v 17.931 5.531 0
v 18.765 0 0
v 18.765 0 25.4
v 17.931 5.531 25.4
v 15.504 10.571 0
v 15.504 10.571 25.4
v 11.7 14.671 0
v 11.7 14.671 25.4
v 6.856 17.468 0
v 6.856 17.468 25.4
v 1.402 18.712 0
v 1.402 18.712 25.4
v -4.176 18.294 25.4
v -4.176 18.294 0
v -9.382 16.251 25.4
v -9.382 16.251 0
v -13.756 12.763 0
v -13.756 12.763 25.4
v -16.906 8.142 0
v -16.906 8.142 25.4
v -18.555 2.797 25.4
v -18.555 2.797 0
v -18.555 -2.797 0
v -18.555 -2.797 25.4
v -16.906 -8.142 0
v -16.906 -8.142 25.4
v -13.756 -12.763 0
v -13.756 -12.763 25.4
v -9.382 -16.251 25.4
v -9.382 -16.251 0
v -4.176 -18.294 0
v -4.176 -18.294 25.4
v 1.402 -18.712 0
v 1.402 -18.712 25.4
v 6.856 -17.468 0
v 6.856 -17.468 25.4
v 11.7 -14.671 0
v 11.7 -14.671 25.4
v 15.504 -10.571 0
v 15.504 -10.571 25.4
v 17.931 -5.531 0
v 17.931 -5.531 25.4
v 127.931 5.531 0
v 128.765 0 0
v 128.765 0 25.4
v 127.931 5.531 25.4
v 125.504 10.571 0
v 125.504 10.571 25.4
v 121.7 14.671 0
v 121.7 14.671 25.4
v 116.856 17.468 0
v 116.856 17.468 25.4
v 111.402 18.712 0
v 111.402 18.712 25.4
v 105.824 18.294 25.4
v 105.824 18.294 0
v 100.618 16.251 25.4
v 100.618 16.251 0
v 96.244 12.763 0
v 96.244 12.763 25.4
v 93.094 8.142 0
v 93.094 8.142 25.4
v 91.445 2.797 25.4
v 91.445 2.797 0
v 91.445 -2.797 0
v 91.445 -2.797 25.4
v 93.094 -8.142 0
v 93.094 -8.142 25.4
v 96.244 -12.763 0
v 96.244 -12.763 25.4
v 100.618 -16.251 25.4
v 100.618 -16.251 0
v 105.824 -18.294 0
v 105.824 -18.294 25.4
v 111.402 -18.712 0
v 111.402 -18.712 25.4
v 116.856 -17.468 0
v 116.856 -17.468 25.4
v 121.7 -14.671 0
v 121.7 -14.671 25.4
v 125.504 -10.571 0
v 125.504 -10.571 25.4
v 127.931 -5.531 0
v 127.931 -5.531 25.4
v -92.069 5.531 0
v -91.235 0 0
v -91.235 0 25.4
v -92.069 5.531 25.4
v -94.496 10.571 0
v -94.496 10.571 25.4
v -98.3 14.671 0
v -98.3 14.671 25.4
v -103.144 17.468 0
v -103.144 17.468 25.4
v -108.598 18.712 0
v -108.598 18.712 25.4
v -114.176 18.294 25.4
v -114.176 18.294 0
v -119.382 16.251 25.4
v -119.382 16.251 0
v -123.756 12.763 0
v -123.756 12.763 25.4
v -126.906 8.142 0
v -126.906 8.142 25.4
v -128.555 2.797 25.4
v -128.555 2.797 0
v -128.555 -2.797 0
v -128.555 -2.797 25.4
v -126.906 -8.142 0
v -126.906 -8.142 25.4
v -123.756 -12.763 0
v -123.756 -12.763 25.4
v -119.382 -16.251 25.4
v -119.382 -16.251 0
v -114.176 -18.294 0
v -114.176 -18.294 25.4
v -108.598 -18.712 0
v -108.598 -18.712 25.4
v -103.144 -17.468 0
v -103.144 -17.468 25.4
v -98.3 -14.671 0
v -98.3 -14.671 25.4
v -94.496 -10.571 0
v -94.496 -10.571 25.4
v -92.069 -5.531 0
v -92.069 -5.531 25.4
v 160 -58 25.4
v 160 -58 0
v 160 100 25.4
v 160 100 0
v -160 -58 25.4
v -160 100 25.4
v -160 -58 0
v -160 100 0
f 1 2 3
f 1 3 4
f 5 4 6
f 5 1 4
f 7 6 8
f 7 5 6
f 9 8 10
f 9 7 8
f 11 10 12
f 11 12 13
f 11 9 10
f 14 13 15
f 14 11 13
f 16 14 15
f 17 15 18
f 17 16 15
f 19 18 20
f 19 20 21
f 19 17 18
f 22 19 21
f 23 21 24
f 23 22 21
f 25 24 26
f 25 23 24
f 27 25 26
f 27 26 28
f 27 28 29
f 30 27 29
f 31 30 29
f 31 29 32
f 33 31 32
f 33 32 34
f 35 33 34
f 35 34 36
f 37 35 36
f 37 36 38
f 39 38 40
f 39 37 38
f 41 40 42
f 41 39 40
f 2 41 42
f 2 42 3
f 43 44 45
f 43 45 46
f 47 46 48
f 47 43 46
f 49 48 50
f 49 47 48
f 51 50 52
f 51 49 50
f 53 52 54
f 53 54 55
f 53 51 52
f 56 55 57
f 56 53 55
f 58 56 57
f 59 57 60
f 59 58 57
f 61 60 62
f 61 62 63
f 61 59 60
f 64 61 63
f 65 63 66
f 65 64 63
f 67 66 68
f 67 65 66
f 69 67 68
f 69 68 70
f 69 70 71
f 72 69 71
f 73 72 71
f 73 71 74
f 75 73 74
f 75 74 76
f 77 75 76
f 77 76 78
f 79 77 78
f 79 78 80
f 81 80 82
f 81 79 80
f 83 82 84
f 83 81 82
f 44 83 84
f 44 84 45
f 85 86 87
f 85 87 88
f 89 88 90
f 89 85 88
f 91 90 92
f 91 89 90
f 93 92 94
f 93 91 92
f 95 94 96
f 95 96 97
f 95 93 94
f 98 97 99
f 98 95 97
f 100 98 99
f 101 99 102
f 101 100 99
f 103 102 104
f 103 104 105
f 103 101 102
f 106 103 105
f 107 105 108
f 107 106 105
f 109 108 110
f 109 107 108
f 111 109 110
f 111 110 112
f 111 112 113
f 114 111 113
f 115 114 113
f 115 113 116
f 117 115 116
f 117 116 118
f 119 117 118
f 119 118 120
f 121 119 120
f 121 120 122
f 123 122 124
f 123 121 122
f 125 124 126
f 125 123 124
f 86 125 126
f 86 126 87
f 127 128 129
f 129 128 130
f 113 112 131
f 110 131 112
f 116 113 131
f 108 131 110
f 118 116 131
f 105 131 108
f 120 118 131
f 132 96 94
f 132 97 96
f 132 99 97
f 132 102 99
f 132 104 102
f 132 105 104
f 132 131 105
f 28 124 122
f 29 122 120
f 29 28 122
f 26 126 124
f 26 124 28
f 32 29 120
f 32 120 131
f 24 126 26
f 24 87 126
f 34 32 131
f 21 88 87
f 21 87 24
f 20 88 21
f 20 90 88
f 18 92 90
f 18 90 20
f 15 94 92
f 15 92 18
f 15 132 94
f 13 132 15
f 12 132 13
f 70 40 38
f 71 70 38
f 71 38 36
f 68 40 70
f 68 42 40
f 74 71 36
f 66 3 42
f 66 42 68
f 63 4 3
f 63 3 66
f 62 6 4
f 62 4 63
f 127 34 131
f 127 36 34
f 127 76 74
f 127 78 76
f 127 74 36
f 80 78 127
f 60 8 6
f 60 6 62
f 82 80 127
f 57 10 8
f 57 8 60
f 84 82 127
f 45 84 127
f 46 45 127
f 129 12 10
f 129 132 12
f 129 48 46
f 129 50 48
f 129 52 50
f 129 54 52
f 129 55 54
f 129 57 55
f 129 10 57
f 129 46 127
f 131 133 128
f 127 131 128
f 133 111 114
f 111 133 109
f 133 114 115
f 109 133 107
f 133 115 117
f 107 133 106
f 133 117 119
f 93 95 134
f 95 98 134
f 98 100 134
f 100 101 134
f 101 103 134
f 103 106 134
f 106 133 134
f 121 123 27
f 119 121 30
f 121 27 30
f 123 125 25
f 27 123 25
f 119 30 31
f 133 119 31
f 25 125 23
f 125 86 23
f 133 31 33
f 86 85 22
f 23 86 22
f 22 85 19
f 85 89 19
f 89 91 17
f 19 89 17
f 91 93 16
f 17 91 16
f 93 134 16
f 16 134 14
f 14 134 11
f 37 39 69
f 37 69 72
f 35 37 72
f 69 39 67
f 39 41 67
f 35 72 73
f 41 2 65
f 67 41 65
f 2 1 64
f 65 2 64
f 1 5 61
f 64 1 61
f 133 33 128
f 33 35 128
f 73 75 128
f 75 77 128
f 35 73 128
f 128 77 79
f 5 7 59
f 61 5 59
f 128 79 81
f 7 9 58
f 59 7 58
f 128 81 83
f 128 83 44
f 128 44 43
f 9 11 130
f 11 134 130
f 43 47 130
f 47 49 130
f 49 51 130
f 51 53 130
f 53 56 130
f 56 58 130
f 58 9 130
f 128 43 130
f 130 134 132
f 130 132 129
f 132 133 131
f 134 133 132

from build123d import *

# Parameters (mm, degrees)
CROQUIS1_W              = 320
CROQUIS1_H              = 158
CROQUIS1_R              = 18.764717073
SALIENTE_EXTRUIR1_DEPTH = 25.4


with BuildPart() as part:
    # Croquis1 → Saliente-Extruir1 (new body)
    with BuildSketch(Plane.XY):
        with Locations((0, 21)):
            Rectangle(CROQUIS1_W, CROQUIS1_H)
        Circle(CROQUIS1_R, mode=Mode.SUBTRACT)
        with Locations((110, 0)):
            Circle(CROQUIS1_R, mode=Mode.SUBTRACT)
        with Locations((-110, 0)):
            Circle(CROQUIS1_R, mode=Mode.SUBTRACT)
    extrude(amount=SALIENTE_EXTRUIR1_DEPTH)


solid = part.part
